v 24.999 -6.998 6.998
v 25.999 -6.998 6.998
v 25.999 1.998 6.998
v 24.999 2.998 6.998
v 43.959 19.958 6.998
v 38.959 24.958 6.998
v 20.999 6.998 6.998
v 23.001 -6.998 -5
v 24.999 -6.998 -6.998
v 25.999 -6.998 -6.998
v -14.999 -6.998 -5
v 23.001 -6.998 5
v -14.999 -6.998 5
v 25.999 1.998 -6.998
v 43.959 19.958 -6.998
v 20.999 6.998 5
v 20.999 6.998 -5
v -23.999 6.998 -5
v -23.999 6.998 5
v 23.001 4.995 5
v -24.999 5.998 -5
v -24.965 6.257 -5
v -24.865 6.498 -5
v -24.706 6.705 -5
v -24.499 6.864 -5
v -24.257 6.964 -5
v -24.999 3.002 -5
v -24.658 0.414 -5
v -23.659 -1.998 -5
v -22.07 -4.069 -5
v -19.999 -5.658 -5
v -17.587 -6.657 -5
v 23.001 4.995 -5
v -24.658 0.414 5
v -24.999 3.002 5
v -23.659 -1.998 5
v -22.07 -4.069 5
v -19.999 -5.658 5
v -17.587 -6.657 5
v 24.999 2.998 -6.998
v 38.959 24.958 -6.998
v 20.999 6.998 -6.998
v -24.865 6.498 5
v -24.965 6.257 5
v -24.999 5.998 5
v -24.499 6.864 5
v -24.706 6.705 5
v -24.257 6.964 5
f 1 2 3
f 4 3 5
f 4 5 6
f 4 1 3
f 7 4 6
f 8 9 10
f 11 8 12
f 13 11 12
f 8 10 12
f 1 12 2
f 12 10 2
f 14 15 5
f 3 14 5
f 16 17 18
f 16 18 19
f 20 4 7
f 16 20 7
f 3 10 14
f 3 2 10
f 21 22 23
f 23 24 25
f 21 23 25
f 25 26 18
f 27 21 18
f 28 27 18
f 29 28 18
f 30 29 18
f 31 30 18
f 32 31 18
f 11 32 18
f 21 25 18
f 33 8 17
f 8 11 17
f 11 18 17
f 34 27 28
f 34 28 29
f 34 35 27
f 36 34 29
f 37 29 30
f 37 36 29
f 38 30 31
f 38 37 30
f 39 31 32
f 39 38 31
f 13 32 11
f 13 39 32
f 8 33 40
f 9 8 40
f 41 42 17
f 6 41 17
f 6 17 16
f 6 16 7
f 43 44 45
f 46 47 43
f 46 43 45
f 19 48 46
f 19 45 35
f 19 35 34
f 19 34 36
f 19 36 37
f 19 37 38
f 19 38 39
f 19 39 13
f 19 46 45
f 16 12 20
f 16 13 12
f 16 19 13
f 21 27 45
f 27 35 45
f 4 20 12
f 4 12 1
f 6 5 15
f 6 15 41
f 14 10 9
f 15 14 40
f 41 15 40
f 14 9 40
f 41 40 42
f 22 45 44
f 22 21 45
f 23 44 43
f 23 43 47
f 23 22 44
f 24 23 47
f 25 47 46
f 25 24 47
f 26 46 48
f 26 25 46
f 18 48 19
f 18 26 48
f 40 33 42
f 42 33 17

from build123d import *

# Parameters (mm, degrees)
F0_W          = 49.99736
F0_H          = 13.9954
F1_DEPTH      = 5
F1_DEPTH_BACK = 5
F2_R          = 1
F3_R          = 10
F4_W          = 13.9954
F4_H          = 13.9954
F5_DEPTH      = 1
F5_DEPTH_BACK = 5
F6_T4_DEPTH   = 39.7122298797
F6_T9_DEPTH   = 39.7122298797
F7_SIZE       = 5
F8_W          = 7.0710678119
F8_H          = 13.9954
F9_DEPTH      = 25.4


# Not quite as in the source:
# - a fillet or chamfer that OpenCascade refuses, or shapes differently, is made with other operations: its cross-section is extruded or revolved along the edge and cut away or added


with BuildPart() as f1:
    # F0 (on Top) → F1 (new body, two sides)
    with BuildSketch(Plane.XY) as f1_sk:
        Rectangle(F0_W, F0_H)
    extrude(amount=F1_DEPTH)
    extrude(f1_sk.sketch, amount=-F1_DEPTH_BACK)

    # F2
    f2_edges = [f1.edges().sort_by_distance(p)[0] for p in [
        (-24.99868, 6.9977, 0),
    ]]
    fillet(f2_edges, radius=F2_R)

    # F3
    f3_edges = [f1.edges().sort_by_distance(p)[0] for p in [
        (-24.99868, -6.9977, 0),
    ]]
    fillet(f3_edges, radius=F3_R)

    # F4 (on face) → F5 (join, two sides)
    with BuildSketch(Plane.YZ.offset(24.99868)) as f5_sk:
        Rectangle(F4_W, F4_H)
    extrude(amount=F5_DEPTH)
    extrude(f5_sk.sketch, amount=-F5_DEPTH_BACK)

    # F6: chamfer of 5 on 2 edges, made by hand


with BuildPart() as f6_tool2:
    # F6_s3 → F6_t4 (new body)
    with BuildSketch(Plane.XZ.offset(-19.8561149398)):
        Polygon((19.99868, 1.9977), (24.99868, 6.9977), (19.99868, 6.9977), align=None)
    extrude(amount=F6_T4_DEPTH)

    split(bisect_by=Plane.XY.offset(5), keep=Keep.TOP)


with BuildPart() as f1_1:
    add(f1.part)

    # F6_t1: cut F6_tool2
    add(f6_tool2.part, mode=Mode.SUBTRACT)


with BuildPart() as f6_tool7:
    # F6_s8 → F6_t9 (new body)
    with BuildSketch(Plane.XZ.offset(19.8561149398)):
        Polygon((19.99868, -1.9977), (24.99868, -6.9977), (19.99868, -6.9977), align=None)
    extrude(amount=-F6_T9_DEPTH)

    split(bisect_by=Plane.XY.offset(-5), keep=Keep.BOTTOM)


with BuildPart() as f1_2:
    add(f1_1.part)

    # F6_t6: cut F6_tool7
    add(f6_tool7.part, mode=Mode.SUBTRACT)

    # F7
    f7_edges = [f1_2.edges().sort_by_distance(p)[0] for p in [
        (25.99868, 6.9977, 0),
    ]]
    chamfer(f7_edges, length=F7_SIZE)

    # F8 (on face) → F9 (join)
    with BuildSketch(Plane(origin=(13.99819, 13.99819, 0), x_dir=(-0.7071067812, 0.7071067812, 0), z_dir=(0.7071067812, 0.7071067812, 0))):
        with Locations((-13.4357218072, 0)):
            Rectangle(F8_W, F8_H)
    extrude(amount=F9_DEPTH)


solid = f1_2.part
